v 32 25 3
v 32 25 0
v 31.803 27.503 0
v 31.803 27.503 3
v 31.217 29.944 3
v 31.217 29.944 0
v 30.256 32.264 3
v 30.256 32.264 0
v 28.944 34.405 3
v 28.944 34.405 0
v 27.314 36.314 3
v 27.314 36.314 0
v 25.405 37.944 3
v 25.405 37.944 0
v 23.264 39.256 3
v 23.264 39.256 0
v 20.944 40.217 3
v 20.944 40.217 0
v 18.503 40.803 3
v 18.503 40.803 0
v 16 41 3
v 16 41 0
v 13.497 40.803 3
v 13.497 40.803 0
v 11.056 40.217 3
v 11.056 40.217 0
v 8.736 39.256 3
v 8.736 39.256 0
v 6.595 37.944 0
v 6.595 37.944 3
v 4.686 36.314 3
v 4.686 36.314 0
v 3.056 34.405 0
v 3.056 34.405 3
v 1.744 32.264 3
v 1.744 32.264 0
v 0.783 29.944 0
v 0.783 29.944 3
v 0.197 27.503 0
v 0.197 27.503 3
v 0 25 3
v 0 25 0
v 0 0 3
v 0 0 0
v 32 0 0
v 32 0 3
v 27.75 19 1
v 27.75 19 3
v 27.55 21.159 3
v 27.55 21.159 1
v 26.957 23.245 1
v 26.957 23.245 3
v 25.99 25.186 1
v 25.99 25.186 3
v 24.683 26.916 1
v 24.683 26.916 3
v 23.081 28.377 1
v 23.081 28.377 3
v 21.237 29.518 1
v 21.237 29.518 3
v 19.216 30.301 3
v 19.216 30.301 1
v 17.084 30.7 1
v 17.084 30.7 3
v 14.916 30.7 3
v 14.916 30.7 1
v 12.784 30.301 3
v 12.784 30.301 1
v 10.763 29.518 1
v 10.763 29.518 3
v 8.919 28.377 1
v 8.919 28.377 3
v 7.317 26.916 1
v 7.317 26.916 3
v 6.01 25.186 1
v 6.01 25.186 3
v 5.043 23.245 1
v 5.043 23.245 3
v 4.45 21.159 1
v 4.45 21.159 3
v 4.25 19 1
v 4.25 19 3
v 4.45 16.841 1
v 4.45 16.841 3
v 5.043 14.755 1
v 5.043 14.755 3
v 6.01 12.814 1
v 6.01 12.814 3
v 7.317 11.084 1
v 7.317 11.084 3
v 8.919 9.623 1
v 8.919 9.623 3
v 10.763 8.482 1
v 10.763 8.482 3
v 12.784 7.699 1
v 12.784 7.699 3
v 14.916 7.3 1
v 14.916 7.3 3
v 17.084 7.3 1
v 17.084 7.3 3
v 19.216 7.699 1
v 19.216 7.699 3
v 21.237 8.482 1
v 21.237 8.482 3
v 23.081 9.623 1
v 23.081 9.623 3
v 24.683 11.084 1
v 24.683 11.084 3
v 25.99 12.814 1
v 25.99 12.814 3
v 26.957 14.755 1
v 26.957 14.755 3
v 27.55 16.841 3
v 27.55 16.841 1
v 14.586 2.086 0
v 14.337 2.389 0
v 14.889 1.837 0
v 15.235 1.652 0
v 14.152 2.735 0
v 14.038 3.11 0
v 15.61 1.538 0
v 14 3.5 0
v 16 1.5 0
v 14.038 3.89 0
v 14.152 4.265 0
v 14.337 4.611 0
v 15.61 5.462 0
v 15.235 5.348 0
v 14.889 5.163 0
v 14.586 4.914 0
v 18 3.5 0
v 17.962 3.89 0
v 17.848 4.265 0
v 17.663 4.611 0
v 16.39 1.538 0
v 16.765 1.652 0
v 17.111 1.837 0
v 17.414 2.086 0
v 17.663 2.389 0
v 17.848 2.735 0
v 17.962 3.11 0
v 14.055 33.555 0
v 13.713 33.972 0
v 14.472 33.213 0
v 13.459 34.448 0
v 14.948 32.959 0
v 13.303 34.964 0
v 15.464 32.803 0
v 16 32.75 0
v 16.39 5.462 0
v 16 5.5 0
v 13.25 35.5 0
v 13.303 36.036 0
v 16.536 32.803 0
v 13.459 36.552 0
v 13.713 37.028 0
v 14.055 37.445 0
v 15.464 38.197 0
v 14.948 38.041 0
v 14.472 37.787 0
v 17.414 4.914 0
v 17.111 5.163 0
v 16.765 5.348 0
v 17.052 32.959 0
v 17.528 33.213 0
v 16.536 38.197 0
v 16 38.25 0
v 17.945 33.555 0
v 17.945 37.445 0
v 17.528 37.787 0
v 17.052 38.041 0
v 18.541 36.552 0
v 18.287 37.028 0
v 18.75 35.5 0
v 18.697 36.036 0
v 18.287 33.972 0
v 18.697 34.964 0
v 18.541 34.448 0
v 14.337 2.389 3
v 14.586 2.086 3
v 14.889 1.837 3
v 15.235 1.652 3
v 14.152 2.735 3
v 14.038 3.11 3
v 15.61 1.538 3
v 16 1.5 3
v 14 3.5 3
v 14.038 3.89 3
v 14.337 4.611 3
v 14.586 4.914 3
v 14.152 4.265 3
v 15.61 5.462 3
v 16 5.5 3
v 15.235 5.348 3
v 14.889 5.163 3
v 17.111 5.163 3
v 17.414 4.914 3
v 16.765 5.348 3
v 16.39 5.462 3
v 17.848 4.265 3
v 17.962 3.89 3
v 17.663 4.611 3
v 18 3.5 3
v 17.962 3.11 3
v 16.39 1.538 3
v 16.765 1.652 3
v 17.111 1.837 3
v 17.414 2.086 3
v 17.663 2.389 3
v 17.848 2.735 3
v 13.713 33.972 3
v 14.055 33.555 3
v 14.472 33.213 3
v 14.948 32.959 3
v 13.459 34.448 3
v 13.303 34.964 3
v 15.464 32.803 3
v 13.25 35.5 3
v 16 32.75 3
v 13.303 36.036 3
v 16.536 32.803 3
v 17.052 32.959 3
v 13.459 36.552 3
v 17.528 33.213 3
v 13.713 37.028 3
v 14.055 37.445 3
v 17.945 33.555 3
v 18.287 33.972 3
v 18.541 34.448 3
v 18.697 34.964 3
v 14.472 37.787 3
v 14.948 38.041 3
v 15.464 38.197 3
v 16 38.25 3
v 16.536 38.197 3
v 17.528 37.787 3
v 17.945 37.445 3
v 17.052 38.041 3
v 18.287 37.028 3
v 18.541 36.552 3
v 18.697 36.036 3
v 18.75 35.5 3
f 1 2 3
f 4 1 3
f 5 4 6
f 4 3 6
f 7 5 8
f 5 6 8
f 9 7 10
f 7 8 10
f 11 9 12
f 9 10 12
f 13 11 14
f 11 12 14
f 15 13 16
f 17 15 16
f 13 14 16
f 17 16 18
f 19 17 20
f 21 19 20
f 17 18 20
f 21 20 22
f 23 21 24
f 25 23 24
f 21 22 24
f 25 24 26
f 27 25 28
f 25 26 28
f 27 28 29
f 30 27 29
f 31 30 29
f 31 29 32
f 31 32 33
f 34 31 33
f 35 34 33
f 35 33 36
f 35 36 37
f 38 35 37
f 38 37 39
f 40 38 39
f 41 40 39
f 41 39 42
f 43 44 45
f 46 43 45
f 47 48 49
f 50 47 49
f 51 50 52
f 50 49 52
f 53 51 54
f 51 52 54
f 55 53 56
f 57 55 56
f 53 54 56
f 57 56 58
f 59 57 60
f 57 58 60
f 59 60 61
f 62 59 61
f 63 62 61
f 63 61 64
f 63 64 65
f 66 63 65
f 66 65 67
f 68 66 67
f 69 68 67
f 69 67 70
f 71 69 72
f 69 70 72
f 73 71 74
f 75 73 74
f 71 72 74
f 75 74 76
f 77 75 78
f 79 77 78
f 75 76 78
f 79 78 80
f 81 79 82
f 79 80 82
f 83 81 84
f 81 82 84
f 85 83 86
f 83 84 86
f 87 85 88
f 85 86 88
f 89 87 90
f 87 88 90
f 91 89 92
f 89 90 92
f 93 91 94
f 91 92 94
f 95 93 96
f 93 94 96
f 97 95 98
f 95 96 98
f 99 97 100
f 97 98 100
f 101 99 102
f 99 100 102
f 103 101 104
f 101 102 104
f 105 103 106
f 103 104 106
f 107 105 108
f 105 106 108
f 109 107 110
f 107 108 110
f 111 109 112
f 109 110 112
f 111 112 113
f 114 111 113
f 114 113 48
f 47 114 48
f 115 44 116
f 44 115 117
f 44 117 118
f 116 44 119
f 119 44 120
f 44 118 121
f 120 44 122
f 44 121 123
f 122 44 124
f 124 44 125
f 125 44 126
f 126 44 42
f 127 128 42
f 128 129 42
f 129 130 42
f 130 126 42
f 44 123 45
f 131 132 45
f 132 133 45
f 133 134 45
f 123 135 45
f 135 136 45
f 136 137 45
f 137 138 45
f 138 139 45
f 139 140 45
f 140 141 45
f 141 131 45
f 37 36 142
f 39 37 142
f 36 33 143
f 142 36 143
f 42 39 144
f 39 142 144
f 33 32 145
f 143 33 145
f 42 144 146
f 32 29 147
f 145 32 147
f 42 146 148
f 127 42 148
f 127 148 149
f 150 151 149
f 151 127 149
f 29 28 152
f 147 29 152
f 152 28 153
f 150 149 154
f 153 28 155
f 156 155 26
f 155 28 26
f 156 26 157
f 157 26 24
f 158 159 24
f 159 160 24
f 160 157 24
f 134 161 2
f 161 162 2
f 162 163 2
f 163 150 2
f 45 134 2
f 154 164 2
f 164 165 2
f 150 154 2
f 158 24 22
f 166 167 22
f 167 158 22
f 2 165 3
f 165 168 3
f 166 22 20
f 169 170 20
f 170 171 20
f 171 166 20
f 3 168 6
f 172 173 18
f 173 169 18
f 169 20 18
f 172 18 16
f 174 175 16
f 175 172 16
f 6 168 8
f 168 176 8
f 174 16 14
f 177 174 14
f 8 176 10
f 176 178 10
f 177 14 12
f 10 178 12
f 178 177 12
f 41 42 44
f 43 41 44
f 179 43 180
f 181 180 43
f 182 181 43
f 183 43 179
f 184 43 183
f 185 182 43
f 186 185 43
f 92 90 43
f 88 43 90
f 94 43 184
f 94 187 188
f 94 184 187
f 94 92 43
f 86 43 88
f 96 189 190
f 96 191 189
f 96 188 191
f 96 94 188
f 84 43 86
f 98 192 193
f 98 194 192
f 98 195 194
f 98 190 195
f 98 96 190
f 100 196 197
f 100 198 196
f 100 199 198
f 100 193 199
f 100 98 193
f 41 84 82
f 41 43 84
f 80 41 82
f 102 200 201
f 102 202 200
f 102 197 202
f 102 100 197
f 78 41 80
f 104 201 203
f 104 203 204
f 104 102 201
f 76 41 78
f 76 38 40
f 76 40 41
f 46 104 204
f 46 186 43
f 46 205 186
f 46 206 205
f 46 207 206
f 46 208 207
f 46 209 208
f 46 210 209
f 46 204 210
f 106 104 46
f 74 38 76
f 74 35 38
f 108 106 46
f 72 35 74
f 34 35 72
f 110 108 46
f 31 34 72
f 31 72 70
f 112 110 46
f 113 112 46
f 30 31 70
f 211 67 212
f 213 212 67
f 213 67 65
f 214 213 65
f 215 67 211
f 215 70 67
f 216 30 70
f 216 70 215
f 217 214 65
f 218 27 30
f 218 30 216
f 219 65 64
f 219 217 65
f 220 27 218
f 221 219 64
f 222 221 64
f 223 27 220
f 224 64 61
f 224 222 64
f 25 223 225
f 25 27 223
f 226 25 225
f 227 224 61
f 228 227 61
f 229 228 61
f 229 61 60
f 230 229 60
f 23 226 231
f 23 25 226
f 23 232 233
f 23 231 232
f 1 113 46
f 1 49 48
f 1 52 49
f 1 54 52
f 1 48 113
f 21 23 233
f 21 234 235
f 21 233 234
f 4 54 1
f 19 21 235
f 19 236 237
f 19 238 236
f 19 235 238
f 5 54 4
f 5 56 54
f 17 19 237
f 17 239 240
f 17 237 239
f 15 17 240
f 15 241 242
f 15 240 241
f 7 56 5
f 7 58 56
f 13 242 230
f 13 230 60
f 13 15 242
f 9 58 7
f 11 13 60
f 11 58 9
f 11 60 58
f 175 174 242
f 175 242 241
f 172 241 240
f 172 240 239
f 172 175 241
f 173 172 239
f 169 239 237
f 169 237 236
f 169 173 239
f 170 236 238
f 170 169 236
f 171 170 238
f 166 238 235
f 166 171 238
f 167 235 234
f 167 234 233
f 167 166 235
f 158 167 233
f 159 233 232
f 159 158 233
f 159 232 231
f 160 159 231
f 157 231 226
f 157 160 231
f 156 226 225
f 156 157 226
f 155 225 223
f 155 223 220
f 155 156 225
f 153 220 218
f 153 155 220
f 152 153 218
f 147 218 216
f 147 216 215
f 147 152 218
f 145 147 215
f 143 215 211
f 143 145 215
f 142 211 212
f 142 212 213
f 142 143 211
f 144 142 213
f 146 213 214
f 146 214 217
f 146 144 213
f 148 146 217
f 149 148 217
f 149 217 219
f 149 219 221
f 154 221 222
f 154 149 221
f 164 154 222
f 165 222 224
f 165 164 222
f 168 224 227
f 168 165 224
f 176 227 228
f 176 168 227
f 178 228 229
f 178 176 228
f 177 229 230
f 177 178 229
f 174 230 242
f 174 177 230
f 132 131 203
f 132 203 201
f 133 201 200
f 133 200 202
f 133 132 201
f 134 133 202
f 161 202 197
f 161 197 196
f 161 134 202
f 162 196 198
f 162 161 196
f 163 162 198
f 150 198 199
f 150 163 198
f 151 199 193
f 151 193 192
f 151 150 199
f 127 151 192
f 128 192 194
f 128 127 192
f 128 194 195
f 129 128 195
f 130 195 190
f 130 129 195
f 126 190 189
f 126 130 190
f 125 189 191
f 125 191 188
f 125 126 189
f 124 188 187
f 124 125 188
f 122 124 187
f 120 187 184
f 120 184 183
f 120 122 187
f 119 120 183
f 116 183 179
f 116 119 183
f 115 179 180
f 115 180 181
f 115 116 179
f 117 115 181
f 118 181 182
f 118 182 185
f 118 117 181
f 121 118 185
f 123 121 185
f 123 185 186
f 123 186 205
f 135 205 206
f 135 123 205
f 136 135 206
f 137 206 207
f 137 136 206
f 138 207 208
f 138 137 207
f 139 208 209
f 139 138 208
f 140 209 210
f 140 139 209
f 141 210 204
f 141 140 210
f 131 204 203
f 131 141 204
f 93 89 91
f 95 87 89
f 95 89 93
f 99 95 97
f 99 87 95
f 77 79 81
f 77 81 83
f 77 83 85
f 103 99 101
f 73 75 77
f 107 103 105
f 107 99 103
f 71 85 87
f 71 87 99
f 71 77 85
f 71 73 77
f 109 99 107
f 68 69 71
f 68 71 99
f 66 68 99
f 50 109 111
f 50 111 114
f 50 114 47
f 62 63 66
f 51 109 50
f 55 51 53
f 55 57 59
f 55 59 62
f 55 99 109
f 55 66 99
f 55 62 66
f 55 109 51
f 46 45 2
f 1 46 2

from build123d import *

# Parameters (mm, degrees)
F0_R     = 2
F0_R_2   = 2.75
F1_DEPTH = 3
F2_R     = 11.75
F3_DEPTH = 2


with BuildPart() as f1:
    # F0 (on Top) → F1 (new body)
    with BuildSketch(Plane.XY):
        with BuildLine():
            Line((0, 25), (0, 0))
            Line((0, 0), (32, 0))
            Line((32, 0), (32, 25))
            ThreePointArc((32, 25), (16, 41), (0, 25))
        make_face()
        with Locations((16, 3.5)):
            Circle(F0_R, mode=Mode.SUBTRACT)
        with Locations((16, 35.5)):
            Circle(F0_R_2, mode=Mode.SUBTRACT)
    extrude(amount=F1_DEPTH)

    # F2 (on face) → F3 (cut)
    with BuildSketch(Plane.XY.offset(3)):
        with Locations((16, 19)):
            Circle(F2_R)
    extrude(amount=-F3_DEPTH, mode=Mode.SUBTRACT)


solid = f1.part
